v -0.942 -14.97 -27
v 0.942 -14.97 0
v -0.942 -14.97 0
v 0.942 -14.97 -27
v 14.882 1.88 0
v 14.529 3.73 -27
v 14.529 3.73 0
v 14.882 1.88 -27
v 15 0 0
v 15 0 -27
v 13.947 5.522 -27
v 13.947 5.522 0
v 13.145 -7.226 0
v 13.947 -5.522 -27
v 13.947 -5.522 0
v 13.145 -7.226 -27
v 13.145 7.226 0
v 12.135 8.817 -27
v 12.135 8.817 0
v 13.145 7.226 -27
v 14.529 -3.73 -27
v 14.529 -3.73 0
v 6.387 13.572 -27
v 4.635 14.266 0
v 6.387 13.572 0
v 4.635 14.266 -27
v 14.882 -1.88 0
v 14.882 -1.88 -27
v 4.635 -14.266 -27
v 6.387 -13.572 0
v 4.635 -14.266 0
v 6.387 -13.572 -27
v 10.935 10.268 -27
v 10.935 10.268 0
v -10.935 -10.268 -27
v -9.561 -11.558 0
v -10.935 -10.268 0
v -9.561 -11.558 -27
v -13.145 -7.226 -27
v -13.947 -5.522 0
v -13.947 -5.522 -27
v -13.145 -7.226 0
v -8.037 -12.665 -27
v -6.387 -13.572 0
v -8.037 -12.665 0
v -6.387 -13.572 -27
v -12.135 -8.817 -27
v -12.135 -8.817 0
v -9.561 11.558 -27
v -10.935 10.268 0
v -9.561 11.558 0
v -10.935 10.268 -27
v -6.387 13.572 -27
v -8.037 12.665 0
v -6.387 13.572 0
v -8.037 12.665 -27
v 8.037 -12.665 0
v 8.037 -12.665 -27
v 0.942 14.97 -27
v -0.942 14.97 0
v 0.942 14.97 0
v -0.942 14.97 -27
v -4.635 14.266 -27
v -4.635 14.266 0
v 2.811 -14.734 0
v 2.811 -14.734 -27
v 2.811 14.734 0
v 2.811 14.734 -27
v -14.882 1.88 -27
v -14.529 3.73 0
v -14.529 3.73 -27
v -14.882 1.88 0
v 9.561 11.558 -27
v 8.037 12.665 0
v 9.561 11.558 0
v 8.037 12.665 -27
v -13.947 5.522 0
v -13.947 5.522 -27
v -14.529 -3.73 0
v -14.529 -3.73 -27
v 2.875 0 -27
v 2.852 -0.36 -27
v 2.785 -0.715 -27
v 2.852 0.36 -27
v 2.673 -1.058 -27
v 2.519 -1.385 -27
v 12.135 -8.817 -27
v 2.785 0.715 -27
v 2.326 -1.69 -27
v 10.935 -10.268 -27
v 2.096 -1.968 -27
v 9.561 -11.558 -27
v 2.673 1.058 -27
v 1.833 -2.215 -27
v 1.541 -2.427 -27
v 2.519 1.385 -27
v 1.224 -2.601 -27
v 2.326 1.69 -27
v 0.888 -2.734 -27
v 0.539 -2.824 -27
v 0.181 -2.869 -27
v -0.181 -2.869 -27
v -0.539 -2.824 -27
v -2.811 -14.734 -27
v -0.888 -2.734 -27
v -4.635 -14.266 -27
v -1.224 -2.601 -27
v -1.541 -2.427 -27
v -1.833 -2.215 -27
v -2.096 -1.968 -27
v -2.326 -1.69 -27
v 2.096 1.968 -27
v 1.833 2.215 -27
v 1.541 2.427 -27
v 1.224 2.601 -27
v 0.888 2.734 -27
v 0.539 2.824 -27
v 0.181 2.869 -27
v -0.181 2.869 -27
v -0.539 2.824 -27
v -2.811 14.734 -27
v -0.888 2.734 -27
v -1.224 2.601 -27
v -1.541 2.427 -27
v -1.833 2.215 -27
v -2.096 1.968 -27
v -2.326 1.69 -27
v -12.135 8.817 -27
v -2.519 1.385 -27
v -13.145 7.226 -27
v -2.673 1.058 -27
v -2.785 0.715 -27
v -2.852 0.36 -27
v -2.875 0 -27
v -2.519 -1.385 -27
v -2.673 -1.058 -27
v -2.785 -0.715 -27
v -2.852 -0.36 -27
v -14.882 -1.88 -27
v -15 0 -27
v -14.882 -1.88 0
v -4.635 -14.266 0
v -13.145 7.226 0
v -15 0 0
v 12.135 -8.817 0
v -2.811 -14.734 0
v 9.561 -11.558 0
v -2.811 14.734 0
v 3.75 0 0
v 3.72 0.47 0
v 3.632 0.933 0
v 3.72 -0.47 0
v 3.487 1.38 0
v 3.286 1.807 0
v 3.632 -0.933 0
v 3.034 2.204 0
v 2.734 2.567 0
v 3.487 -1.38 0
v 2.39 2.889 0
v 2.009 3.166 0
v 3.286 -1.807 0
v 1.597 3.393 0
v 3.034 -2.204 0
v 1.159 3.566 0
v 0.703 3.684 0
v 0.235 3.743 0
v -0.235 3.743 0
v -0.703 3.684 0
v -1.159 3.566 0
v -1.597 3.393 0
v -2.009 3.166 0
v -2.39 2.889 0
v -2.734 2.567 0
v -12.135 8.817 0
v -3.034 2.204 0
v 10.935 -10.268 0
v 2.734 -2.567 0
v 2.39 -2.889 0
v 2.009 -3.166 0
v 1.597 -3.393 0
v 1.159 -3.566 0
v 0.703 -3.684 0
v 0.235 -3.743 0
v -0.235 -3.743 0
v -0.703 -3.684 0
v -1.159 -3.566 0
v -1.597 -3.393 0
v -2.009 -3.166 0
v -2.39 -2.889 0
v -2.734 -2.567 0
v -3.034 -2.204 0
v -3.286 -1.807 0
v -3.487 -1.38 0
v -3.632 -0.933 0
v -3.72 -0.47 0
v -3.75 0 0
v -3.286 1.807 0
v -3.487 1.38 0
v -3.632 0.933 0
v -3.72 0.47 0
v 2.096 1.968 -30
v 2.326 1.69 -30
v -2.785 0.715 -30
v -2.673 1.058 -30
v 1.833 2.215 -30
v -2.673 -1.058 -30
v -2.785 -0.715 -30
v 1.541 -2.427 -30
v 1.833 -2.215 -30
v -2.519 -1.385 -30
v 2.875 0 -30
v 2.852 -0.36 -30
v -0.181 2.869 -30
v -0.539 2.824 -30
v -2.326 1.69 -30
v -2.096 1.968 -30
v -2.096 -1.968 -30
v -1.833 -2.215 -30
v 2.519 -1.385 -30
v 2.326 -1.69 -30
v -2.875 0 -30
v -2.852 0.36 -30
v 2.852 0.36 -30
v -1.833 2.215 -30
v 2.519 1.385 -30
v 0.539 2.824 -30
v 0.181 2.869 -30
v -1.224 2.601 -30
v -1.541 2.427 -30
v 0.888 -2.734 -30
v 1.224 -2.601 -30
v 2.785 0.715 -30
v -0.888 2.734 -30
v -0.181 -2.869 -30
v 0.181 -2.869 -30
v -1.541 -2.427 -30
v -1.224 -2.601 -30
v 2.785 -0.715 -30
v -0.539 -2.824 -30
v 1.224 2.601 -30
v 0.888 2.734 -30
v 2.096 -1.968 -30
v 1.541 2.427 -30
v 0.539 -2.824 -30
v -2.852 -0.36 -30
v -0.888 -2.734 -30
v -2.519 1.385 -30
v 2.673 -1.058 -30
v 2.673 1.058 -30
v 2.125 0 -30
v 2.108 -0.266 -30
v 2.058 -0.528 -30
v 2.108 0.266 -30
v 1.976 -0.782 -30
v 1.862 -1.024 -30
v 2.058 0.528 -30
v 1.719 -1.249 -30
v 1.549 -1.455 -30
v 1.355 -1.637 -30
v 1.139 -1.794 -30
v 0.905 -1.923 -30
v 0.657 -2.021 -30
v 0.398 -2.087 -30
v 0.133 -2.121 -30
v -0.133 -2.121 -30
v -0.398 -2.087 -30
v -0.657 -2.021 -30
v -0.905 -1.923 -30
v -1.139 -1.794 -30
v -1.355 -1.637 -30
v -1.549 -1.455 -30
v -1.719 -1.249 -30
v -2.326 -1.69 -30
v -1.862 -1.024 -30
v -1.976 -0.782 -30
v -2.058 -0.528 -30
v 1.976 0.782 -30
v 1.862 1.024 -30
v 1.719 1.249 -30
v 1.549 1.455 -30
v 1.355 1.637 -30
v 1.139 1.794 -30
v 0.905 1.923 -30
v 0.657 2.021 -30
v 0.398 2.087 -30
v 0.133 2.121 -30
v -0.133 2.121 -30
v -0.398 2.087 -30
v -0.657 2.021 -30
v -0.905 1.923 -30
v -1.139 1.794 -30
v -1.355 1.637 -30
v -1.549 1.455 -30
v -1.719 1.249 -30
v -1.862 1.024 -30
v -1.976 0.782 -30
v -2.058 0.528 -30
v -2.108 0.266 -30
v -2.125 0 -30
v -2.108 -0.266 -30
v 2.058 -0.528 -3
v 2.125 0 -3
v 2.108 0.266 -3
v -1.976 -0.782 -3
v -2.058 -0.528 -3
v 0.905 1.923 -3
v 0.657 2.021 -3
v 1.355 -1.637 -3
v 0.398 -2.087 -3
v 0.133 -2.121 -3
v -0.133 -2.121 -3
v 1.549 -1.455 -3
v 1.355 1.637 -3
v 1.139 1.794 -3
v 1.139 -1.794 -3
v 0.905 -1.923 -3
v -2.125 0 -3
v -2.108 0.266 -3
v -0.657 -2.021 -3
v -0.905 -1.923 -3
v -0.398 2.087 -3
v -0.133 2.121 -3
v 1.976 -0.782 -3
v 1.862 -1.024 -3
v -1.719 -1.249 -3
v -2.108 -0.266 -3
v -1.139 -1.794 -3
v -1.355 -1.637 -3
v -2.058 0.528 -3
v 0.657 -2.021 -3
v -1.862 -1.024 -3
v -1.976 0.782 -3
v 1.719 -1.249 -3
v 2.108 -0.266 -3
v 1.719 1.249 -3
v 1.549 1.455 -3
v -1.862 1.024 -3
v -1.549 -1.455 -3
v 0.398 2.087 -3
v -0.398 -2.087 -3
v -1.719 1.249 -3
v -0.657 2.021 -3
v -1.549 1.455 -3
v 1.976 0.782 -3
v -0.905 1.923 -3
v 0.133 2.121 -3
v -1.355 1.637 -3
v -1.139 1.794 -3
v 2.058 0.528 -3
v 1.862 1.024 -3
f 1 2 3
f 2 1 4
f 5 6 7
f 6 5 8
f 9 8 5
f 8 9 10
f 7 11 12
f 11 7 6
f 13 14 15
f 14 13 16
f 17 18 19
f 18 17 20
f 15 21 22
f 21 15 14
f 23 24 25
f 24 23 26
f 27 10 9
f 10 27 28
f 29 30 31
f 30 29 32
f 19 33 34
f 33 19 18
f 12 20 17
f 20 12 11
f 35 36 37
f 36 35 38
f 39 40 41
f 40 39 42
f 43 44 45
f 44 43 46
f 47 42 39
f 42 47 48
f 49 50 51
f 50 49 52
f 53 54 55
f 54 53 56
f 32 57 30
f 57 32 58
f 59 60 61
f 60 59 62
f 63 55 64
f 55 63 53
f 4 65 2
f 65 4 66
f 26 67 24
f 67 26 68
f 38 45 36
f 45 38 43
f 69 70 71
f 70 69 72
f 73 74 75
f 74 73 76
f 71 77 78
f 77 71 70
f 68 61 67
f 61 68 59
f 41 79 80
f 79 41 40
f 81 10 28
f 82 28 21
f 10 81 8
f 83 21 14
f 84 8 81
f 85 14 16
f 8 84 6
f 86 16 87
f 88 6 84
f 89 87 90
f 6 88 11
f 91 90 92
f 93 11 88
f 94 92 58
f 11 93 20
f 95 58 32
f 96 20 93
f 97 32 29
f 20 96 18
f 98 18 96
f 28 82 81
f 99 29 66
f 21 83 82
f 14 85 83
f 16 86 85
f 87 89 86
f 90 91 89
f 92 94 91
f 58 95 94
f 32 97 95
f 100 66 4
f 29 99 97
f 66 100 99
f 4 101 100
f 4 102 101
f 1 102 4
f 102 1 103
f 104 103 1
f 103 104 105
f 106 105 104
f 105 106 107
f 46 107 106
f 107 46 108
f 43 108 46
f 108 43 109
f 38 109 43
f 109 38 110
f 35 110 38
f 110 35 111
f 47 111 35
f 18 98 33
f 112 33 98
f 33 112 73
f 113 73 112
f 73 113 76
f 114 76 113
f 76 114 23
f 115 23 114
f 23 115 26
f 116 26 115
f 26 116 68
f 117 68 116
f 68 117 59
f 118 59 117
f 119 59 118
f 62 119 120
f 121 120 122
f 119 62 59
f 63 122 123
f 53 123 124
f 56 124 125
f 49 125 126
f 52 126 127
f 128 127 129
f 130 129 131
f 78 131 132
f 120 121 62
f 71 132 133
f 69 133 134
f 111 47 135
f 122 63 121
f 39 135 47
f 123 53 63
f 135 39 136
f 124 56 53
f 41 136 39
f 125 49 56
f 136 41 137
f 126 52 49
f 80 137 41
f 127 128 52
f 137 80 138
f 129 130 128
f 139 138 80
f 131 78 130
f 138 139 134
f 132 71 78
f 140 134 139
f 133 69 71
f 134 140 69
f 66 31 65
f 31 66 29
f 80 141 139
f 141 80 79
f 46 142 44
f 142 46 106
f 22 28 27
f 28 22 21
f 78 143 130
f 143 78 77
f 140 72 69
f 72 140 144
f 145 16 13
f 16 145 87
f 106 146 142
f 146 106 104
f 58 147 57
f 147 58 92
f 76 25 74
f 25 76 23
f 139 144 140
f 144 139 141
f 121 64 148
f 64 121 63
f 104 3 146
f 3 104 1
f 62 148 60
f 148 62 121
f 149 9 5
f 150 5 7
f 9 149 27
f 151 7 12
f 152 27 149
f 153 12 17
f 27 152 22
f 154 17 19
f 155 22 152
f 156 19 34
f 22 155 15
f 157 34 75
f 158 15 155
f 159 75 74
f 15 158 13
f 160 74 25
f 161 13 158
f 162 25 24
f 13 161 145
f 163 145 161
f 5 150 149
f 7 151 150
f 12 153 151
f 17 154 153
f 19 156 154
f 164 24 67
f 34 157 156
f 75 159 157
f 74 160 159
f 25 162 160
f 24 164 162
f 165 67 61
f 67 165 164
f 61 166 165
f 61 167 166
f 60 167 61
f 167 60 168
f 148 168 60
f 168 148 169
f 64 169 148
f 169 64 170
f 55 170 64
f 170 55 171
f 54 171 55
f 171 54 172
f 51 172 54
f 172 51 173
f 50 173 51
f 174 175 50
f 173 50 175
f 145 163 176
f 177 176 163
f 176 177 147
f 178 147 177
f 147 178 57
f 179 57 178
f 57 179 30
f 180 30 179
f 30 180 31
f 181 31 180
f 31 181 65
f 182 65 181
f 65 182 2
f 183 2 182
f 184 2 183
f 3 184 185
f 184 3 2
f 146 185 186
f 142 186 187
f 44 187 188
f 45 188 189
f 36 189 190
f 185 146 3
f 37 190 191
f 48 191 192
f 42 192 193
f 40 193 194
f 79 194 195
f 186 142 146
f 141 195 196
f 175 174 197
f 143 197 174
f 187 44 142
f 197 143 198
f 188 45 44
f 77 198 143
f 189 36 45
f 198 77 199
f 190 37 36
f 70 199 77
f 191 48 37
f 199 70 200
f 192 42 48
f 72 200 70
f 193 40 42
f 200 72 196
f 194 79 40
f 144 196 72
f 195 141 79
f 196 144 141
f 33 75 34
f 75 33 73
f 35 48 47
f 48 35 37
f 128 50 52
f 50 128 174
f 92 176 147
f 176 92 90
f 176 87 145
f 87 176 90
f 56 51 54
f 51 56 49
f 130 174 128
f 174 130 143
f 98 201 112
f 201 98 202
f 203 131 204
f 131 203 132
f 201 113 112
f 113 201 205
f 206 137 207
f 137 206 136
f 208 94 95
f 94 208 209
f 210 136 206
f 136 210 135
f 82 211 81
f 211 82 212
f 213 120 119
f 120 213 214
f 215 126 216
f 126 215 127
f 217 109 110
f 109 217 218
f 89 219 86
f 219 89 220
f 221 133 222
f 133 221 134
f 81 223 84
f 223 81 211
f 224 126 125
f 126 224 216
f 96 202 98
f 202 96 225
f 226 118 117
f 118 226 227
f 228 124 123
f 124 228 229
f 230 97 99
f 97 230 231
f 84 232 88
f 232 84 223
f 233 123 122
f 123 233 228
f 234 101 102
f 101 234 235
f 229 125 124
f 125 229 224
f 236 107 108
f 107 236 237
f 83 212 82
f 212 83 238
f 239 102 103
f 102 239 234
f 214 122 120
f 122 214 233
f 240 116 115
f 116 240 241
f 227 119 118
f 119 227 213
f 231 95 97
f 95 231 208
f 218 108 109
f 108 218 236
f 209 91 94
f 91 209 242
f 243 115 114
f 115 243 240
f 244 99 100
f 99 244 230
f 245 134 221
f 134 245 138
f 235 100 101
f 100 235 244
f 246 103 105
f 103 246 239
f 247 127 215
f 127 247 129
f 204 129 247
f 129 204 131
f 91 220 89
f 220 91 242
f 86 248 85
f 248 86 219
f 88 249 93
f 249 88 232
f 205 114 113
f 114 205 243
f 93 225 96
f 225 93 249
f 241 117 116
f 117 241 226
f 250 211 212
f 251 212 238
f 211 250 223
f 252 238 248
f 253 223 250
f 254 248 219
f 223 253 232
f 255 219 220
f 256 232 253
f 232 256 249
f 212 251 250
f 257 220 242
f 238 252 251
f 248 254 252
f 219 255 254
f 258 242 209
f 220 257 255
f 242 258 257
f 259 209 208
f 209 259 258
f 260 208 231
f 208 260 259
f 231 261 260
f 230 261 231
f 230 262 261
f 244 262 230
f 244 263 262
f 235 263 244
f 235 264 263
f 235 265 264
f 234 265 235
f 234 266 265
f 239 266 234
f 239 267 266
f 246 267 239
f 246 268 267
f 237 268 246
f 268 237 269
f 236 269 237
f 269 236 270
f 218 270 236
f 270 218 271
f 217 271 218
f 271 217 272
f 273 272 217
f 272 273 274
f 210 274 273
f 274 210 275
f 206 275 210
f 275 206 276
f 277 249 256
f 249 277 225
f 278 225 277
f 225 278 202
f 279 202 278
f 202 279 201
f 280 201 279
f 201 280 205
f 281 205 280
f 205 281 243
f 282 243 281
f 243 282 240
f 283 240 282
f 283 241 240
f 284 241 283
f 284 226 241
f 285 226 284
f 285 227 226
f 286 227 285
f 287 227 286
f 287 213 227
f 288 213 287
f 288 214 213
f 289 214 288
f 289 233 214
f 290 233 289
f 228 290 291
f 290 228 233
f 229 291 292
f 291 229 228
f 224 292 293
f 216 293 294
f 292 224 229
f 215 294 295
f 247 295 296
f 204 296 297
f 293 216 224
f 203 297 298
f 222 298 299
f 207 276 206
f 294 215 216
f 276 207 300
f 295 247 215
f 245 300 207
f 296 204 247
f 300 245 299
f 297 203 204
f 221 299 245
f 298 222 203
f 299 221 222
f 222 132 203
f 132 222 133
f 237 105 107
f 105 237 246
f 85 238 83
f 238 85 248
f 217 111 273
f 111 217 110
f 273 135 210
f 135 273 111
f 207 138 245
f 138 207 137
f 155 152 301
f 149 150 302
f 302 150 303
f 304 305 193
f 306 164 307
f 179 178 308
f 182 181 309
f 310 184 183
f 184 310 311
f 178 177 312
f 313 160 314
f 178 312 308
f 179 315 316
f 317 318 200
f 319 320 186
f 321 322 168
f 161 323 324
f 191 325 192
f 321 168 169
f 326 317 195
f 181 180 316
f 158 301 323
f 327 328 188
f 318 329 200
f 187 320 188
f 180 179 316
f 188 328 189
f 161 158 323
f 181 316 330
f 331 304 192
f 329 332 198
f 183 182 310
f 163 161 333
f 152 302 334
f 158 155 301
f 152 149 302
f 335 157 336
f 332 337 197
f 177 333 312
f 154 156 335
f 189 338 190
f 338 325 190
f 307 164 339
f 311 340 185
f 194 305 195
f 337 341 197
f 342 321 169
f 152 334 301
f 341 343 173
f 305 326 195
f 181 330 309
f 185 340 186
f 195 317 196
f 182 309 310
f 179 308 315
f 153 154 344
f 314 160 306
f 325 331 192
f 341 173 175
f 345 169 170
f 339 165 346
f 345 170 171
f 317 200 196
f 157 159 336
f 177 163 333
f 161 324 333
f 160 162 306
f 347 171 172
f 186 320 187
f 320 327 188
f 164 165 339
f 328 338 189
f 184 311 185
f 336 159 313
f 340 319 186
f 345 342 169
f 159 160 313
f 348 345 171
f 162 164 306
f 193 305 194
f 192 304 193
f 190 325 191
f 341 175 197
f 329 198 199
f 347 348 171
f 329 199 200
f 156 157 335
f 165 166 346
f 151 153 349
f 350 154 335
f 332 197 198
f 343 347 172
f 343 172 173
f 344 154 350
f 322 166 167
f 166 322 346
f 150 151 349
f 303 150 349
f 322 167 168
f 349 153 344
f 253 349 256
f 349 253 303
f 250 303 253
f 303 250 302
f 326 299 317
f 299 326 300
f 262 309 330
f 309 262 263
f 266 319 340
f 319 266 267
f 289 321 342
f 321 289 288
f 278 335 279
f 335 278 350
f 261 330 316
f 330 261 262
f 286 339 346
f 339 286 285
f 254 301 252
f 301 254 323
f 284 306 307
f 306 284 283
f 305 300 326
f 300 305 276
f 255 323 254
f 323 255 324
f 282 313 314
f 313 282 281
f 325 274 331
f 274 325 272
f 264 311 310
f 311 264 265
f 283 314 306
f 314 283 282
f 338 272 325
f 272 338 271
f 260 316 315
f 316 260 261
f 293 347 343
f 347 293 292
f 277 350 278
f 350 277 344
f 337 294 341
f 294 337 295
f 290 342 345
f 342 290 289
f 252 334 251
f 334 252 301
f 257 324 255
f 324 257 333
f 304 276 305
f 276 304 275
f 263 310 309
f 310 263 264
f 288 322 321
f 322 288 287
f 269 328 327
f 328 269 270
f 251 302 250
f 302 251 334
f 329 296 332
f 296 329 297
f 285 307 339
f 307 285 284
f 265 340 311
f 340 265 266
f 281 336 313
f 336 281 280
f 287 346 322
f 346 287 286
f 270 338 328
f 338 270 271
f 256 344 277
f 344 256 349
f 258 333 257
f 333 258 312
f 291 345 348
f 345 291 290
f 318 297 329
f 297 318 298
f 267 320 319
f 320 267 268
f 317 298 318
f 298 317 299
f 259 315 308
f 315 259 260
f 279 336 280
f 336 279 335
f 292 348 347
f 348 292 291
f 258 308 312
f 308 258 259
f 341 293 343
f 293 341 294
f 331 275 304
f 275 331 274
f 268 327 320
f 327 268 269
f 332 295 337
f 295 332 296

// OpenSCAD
$fn = 50;


difference() {
	union() {
		translate(v = [0, 0, -27.0000000000]) {
			cylinder(h = 27, r = 15.0000000000);
		}
		#translate(v = [0, 0, -30.0000000000]) {
			cylinder(h = 30, r = 2.8750000000);
		}
	}
	union() {
		translate(v = [0, 0, 0]) {
			rotate(a = [0, 0, 0]) {
				difference() {
					union() {
						translate(v = [0, 0, -30.0000000000]) {
							cylinder(h = 30, r = 2.0000000000);
						}
						translate(v = [0, 0, -3]) {
							cylinder(h = 3, r1 = 2.1250000000, r2 = 3.7500000000);
						}
						translate(v = [0, 0, -30.0000000000]) {
							cylinder(h = 30, r = 2.1250000000);
						}
						translate(v = [0, 0, -30.0000000000]) {
							cylinder(h = 30, r = 2.0000000000);
						}
					}
					union();
				}
			}
		}
	}
}
